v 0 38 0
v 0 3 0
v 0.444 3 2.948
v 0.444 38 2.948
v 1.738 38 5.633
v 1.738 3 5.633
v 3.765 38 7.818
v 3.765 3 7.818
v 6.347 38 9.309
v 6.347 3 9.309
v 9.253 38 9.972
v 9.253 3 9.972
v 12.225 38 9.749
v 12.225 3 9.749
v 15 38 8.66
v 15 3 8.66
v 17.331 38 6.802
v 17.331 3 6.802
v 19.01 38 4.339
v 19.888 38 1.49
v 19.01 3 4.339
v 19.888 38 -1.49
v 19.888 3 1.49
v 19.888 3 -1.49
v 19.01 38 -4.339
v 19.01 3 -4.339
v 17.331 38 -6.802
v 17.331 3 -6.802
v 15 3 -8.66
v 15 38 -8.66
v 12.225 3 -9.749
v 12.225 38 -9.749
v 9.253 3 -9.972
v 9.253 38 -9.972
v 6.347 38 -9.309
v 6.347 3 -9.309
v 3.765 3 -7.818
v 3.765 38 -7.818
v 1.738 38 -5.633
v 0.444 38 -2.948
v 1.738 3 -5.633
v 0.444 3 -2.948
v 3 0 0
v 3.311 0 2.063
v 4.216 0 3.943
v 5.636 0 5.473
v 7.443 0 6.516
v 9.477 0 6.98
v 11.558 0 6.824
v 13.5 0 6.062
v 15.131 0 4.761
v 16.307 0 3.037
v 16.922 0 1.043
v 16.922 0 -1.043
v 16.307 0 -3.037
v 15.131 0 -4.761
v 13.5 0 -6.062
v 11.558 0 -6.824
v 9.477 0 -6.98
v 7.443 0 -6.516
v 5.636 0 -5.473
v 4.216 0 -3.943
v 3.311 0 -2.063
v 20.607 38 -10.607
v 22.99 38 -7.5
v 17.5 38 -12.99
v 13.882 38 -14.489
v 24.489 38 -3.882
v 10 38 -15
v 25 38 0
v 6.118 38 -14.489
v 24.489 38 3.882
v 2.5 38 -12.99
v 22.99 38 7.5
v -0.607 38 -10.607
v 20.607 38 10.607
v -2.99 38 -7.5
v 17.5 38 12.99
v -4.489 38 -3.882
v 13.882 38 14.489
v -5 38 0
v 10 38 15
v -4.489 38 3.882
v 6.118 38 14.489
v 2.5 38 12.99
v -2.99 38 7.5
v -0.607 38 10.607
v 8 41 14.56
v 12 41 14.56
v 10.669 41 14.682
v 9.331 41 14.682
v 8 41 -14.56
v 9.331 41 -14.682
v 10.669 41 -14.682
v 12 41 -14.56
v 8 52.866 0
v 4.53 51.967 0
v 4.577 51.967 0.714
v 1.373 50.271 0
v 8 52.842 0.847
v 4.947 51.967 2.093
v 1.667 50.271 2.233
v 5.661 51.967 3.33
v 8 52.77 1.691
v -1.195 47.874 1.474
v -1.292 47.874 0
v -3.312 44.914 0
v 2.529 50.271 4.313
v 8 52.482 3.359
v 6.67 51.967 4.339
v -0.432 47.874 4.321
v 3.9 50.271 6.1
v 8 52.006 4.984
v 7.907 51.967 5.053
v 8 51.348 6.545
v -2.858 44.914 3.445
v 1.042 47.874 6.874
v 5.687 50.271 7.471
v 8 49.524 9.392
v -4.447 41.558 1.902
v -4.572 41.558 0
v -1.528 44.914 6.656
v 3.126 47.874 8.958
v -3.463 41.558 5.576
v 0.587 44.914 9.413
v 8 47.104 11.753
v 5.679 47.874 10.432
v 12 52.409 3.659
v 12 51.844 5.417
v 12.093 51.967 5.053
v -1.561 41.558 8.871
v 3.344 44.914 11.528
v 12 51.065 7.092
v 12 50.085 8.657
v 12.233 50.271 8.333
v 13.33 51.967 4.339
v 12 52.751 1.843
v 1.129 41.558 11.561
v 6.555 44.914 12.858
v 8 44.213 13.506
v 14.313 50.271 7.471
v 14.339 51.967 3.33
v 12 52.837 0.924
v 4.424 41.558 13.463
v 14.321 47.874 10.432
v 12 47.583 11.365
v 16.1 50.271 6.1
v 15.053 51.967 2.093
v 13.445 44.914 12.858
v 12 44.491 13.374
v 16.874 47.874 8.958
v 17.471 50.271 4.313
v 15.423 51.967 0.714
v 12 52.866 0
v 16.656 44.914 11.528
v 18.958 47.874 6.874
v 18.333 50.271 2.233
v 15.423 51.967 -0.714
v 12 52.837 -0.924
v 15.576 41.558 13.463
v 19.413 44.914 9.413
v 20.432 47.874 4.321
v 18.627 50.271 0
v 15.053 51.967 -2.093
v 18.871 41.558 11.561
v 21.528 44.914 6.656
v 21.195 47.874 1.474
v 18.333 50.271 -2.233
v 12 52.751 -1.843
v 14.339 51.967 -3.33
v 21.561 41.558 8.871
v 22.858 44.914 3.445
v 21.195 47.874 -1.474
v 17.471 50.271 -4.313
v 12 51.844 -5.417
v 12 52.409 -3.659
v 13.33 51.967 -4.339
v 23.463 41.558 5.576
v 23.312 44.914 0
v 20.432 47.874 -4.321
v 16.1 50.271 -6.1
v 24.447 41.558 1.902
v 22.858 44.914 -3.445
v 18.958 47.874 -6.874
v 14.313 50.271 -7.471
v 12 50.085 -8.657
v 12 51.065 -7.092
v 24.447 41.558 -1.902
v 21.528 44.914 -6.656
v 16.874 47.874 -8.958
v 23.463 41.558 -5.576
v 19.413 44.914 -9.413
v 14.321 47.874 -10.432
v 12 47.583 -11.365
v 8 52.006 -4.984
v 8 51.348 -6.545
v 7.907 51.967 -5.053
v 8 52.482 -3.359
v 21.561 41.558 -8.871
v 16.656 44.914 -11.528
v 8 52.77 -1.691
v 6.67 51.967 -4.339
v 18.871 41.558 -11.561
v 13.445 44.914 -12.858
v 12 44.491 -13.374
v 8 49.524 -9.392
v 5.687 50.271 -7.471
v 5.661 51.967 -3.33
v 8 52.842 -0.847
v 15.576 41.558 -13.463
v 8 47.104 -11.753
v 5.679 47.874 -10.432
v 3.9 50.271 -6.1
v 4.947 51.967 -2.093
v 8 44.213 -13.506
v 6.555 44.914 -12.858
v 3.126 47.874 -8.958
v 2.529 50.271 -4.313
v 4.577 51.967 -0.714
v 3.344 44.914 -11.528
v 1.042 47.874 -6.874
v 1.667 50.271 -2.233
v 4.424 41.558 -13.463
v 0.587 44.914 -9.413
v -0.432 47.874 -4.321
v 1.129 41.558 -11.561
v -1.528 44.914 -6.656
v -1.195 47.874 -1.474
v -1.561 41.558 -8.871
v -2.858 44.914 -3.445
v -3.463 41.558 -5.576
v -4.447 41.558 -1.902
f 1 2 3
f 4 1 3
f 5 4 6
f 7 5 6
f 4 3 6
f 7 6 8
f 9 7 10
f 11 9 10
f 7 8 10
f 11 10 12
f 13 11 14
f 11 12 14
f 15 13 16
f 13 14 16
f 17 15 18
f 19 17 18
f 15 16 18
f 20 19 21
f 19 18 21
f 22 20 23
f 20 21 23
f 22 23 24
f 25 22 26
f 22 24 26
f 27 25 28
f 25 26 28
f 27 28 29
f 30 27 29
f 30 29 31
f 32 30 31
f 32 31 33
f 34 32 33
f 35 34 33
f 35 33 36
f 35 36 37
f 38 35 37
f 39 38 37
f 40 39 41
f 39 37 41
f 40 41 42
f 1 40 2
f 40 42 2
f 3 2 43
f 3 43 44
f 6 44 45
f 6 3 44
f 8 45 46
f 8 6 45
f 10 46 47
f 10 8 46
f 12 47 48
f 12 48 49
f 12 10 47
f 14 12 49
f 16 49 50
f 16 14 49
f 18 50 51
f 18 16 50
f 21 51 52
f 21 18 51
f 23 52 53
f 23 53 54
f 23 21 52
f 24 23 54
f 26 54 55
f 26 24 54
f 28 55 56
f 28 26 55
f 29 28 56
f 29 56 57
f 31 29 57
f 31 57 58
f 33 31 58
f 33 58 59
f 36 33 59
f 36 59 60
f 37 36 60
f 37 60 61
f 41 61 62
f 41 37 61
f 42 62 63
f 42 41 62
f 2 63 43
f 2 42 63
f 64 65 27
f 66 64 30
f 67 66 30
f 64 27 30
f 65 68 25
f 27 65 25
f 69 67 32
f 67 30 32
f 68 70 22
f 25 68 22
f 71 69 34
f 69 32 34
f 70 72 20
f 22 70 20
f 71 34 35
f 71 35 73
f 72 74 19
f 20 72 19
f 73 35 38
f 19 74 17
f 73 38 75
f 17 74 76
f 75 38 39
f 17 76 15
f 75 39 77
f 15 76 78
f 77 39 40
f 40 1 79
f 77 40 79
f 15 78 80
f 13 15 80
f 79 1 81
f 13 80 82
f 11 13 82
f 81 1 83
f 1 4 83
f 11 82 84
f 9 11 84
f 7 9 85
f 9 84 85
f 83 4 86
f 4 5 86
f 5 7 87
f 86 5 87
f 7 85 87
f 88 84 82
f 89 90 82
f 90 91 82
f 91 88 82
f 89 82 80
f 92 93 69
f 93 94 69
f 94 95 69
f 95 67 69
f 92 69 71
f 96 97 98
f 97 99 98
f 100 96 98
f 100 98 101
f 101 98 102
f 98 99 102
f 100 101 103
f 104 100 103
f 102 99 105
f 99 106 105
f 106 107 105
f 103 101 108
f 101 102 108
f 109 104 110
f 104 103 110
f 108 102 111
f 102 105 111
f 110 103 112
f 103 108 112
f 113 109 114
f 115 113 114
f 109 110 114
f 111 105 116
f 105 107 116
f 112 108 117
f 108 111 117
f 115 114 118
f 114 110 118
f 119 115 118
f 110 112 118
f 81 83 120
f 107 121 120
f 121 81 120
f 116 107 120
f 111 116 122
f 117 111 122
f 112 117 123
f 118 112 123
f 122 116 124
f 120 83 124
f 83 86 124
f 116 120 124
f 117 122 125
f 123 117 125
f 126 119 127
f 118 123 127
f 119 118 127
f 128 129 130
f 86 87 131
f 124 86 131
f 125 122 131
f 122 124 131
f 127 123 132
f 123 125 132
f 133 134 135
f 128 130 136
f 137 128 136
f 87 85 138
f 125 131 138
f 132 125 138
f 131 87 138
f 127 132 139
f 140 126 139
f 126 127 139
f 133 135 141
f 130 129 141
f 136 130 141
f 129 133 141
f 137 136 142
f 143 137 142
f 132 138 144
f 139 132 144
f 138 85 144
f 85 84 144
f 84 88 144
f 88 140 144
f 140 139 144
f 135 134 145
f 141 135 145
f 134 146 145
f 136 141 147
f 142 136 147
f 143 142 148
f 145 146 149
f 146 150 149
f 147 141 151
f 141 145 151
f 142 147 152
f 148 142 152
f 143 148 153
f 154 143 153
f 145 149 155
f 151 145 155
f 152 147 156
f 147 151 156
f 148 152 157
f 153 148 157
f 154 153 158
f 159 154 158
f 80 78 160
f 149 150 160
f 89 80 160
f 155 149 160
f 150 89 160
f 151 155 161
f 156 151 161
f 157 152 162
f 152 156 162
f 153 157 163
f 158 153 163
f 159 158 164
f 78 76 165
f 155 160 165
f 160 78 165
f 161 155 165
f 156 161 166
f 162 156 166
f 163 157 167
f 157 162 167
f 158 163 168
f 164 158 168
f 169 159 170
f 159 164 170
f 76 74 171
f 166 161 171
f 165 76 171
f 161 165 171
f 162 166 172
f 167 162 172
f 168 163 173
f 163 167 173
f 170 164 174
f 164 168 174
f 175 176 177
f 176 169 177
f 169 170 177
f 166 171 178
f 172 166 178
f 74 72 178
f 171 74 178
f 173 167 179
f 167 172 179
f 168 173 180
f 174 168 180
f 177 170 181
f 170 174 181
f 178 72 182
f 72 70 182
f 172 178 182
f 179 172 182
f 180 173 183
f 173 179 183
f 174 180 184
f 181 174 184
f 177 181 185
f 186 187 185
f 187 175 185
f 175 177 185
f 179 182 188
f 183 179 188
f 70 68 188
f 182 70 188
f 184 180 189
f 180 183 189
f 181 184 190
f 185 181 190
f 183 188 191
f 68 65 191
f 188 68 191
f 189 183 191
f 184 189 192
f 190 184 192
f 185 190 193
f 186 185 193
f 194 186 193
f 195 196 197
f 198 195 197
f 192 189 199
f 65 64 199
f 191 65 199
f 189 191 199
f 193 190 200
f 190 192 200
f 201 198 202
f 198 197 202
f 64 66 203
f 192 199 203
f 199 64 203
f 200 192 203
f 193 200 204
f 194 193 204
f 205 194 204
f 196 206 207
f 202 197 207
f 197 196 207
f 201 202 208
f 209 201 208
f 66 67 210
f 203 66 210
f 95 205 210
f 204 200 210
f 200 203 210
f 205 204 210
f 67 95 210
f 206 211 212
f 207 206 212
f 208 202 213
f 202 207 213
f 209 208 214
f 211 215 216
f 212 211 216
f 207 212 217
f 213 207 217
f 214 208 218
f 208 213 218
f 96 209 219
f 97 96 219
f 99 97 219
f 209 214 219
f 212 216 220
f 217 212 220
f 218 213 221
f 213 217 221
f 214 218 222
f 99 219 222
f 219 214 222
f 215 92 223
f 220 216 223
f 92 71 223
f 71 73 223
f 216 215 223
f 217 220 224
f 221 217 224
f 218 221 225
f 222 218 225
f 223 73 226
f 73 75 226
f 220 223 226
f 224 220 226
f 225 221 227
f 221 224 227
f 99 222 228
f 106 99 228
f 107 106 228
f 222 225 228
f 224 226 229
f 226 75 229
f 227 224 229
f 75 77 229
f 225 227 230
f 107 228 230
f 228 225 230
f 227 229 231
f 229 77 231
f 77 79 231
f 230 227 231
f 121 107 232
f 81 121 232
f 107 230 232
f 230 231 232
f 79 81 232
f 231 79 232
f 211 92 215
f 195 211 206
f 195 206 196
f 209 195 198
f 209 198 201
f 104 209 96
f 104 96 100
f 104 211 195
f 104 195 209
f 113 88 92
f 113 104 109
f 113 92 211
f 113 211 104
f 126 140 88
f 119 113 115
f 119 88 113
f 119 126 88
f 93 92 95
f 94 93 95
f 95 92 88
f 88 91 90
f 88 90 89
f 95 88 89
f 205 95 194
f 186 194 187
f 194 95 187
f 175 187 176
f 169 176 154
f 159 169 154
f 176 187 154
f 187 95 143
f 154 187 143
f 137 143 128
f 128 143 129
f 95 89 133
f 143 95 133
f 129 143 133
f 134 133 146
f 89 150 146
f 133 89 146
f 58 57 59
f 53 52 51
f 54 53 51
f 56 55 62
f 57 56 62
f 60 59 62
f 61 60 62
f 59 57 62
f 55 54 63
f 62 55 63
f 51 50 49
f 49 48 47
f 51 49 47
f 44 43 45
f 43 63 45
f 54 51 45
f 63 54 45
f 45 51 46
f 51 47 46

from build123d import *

# Parameters (mm, degrees)
SKETCH6_W          = 4
SKETCH6_H          = 15
CUT_EXTRUDE1_DEPTH = 27.5
CHAMFER1_SIZE      = 3


with BuildPart() as part:
    # Sketch4 → Revolve1 (revolve)
    with BuildSketch(Plane.XY):
        with BuildLine():
            Line((0, 0), (10, 0))
            Line((10, 0), (10, 53))
            ThreePointArc((10, 53), (-0.606601718, 48.606601718), (-5, 38))
            Line((-5, 38), (0, 38))
            Line((0, 38), (0, 0))
        make_face()
    revolve(axis=Axis((10, -13.659497016, 0), (0, 1, 0)))

    # Sketch6 → Cut-Extrude1 (cut, symmetric)
    with BuildSketch(Plane.XY):
        with Locations((10, 48.5)):
            Rectangle(SKETCH6_W, SKETCH6_H)
    extrude(amount=CUT_EXTRUDE1_DEPTH, both=True, mode=Mode.SUBTRACT)

    # Chamfer1
    chamfer1_edges = [part.edges().sort_by_distance(p)[0] for p in [
        (20, 0, 0),
    ]]
    chamfer(chamfer1_edges, length=CHAMFER1_SIZE)


solid = part.part
